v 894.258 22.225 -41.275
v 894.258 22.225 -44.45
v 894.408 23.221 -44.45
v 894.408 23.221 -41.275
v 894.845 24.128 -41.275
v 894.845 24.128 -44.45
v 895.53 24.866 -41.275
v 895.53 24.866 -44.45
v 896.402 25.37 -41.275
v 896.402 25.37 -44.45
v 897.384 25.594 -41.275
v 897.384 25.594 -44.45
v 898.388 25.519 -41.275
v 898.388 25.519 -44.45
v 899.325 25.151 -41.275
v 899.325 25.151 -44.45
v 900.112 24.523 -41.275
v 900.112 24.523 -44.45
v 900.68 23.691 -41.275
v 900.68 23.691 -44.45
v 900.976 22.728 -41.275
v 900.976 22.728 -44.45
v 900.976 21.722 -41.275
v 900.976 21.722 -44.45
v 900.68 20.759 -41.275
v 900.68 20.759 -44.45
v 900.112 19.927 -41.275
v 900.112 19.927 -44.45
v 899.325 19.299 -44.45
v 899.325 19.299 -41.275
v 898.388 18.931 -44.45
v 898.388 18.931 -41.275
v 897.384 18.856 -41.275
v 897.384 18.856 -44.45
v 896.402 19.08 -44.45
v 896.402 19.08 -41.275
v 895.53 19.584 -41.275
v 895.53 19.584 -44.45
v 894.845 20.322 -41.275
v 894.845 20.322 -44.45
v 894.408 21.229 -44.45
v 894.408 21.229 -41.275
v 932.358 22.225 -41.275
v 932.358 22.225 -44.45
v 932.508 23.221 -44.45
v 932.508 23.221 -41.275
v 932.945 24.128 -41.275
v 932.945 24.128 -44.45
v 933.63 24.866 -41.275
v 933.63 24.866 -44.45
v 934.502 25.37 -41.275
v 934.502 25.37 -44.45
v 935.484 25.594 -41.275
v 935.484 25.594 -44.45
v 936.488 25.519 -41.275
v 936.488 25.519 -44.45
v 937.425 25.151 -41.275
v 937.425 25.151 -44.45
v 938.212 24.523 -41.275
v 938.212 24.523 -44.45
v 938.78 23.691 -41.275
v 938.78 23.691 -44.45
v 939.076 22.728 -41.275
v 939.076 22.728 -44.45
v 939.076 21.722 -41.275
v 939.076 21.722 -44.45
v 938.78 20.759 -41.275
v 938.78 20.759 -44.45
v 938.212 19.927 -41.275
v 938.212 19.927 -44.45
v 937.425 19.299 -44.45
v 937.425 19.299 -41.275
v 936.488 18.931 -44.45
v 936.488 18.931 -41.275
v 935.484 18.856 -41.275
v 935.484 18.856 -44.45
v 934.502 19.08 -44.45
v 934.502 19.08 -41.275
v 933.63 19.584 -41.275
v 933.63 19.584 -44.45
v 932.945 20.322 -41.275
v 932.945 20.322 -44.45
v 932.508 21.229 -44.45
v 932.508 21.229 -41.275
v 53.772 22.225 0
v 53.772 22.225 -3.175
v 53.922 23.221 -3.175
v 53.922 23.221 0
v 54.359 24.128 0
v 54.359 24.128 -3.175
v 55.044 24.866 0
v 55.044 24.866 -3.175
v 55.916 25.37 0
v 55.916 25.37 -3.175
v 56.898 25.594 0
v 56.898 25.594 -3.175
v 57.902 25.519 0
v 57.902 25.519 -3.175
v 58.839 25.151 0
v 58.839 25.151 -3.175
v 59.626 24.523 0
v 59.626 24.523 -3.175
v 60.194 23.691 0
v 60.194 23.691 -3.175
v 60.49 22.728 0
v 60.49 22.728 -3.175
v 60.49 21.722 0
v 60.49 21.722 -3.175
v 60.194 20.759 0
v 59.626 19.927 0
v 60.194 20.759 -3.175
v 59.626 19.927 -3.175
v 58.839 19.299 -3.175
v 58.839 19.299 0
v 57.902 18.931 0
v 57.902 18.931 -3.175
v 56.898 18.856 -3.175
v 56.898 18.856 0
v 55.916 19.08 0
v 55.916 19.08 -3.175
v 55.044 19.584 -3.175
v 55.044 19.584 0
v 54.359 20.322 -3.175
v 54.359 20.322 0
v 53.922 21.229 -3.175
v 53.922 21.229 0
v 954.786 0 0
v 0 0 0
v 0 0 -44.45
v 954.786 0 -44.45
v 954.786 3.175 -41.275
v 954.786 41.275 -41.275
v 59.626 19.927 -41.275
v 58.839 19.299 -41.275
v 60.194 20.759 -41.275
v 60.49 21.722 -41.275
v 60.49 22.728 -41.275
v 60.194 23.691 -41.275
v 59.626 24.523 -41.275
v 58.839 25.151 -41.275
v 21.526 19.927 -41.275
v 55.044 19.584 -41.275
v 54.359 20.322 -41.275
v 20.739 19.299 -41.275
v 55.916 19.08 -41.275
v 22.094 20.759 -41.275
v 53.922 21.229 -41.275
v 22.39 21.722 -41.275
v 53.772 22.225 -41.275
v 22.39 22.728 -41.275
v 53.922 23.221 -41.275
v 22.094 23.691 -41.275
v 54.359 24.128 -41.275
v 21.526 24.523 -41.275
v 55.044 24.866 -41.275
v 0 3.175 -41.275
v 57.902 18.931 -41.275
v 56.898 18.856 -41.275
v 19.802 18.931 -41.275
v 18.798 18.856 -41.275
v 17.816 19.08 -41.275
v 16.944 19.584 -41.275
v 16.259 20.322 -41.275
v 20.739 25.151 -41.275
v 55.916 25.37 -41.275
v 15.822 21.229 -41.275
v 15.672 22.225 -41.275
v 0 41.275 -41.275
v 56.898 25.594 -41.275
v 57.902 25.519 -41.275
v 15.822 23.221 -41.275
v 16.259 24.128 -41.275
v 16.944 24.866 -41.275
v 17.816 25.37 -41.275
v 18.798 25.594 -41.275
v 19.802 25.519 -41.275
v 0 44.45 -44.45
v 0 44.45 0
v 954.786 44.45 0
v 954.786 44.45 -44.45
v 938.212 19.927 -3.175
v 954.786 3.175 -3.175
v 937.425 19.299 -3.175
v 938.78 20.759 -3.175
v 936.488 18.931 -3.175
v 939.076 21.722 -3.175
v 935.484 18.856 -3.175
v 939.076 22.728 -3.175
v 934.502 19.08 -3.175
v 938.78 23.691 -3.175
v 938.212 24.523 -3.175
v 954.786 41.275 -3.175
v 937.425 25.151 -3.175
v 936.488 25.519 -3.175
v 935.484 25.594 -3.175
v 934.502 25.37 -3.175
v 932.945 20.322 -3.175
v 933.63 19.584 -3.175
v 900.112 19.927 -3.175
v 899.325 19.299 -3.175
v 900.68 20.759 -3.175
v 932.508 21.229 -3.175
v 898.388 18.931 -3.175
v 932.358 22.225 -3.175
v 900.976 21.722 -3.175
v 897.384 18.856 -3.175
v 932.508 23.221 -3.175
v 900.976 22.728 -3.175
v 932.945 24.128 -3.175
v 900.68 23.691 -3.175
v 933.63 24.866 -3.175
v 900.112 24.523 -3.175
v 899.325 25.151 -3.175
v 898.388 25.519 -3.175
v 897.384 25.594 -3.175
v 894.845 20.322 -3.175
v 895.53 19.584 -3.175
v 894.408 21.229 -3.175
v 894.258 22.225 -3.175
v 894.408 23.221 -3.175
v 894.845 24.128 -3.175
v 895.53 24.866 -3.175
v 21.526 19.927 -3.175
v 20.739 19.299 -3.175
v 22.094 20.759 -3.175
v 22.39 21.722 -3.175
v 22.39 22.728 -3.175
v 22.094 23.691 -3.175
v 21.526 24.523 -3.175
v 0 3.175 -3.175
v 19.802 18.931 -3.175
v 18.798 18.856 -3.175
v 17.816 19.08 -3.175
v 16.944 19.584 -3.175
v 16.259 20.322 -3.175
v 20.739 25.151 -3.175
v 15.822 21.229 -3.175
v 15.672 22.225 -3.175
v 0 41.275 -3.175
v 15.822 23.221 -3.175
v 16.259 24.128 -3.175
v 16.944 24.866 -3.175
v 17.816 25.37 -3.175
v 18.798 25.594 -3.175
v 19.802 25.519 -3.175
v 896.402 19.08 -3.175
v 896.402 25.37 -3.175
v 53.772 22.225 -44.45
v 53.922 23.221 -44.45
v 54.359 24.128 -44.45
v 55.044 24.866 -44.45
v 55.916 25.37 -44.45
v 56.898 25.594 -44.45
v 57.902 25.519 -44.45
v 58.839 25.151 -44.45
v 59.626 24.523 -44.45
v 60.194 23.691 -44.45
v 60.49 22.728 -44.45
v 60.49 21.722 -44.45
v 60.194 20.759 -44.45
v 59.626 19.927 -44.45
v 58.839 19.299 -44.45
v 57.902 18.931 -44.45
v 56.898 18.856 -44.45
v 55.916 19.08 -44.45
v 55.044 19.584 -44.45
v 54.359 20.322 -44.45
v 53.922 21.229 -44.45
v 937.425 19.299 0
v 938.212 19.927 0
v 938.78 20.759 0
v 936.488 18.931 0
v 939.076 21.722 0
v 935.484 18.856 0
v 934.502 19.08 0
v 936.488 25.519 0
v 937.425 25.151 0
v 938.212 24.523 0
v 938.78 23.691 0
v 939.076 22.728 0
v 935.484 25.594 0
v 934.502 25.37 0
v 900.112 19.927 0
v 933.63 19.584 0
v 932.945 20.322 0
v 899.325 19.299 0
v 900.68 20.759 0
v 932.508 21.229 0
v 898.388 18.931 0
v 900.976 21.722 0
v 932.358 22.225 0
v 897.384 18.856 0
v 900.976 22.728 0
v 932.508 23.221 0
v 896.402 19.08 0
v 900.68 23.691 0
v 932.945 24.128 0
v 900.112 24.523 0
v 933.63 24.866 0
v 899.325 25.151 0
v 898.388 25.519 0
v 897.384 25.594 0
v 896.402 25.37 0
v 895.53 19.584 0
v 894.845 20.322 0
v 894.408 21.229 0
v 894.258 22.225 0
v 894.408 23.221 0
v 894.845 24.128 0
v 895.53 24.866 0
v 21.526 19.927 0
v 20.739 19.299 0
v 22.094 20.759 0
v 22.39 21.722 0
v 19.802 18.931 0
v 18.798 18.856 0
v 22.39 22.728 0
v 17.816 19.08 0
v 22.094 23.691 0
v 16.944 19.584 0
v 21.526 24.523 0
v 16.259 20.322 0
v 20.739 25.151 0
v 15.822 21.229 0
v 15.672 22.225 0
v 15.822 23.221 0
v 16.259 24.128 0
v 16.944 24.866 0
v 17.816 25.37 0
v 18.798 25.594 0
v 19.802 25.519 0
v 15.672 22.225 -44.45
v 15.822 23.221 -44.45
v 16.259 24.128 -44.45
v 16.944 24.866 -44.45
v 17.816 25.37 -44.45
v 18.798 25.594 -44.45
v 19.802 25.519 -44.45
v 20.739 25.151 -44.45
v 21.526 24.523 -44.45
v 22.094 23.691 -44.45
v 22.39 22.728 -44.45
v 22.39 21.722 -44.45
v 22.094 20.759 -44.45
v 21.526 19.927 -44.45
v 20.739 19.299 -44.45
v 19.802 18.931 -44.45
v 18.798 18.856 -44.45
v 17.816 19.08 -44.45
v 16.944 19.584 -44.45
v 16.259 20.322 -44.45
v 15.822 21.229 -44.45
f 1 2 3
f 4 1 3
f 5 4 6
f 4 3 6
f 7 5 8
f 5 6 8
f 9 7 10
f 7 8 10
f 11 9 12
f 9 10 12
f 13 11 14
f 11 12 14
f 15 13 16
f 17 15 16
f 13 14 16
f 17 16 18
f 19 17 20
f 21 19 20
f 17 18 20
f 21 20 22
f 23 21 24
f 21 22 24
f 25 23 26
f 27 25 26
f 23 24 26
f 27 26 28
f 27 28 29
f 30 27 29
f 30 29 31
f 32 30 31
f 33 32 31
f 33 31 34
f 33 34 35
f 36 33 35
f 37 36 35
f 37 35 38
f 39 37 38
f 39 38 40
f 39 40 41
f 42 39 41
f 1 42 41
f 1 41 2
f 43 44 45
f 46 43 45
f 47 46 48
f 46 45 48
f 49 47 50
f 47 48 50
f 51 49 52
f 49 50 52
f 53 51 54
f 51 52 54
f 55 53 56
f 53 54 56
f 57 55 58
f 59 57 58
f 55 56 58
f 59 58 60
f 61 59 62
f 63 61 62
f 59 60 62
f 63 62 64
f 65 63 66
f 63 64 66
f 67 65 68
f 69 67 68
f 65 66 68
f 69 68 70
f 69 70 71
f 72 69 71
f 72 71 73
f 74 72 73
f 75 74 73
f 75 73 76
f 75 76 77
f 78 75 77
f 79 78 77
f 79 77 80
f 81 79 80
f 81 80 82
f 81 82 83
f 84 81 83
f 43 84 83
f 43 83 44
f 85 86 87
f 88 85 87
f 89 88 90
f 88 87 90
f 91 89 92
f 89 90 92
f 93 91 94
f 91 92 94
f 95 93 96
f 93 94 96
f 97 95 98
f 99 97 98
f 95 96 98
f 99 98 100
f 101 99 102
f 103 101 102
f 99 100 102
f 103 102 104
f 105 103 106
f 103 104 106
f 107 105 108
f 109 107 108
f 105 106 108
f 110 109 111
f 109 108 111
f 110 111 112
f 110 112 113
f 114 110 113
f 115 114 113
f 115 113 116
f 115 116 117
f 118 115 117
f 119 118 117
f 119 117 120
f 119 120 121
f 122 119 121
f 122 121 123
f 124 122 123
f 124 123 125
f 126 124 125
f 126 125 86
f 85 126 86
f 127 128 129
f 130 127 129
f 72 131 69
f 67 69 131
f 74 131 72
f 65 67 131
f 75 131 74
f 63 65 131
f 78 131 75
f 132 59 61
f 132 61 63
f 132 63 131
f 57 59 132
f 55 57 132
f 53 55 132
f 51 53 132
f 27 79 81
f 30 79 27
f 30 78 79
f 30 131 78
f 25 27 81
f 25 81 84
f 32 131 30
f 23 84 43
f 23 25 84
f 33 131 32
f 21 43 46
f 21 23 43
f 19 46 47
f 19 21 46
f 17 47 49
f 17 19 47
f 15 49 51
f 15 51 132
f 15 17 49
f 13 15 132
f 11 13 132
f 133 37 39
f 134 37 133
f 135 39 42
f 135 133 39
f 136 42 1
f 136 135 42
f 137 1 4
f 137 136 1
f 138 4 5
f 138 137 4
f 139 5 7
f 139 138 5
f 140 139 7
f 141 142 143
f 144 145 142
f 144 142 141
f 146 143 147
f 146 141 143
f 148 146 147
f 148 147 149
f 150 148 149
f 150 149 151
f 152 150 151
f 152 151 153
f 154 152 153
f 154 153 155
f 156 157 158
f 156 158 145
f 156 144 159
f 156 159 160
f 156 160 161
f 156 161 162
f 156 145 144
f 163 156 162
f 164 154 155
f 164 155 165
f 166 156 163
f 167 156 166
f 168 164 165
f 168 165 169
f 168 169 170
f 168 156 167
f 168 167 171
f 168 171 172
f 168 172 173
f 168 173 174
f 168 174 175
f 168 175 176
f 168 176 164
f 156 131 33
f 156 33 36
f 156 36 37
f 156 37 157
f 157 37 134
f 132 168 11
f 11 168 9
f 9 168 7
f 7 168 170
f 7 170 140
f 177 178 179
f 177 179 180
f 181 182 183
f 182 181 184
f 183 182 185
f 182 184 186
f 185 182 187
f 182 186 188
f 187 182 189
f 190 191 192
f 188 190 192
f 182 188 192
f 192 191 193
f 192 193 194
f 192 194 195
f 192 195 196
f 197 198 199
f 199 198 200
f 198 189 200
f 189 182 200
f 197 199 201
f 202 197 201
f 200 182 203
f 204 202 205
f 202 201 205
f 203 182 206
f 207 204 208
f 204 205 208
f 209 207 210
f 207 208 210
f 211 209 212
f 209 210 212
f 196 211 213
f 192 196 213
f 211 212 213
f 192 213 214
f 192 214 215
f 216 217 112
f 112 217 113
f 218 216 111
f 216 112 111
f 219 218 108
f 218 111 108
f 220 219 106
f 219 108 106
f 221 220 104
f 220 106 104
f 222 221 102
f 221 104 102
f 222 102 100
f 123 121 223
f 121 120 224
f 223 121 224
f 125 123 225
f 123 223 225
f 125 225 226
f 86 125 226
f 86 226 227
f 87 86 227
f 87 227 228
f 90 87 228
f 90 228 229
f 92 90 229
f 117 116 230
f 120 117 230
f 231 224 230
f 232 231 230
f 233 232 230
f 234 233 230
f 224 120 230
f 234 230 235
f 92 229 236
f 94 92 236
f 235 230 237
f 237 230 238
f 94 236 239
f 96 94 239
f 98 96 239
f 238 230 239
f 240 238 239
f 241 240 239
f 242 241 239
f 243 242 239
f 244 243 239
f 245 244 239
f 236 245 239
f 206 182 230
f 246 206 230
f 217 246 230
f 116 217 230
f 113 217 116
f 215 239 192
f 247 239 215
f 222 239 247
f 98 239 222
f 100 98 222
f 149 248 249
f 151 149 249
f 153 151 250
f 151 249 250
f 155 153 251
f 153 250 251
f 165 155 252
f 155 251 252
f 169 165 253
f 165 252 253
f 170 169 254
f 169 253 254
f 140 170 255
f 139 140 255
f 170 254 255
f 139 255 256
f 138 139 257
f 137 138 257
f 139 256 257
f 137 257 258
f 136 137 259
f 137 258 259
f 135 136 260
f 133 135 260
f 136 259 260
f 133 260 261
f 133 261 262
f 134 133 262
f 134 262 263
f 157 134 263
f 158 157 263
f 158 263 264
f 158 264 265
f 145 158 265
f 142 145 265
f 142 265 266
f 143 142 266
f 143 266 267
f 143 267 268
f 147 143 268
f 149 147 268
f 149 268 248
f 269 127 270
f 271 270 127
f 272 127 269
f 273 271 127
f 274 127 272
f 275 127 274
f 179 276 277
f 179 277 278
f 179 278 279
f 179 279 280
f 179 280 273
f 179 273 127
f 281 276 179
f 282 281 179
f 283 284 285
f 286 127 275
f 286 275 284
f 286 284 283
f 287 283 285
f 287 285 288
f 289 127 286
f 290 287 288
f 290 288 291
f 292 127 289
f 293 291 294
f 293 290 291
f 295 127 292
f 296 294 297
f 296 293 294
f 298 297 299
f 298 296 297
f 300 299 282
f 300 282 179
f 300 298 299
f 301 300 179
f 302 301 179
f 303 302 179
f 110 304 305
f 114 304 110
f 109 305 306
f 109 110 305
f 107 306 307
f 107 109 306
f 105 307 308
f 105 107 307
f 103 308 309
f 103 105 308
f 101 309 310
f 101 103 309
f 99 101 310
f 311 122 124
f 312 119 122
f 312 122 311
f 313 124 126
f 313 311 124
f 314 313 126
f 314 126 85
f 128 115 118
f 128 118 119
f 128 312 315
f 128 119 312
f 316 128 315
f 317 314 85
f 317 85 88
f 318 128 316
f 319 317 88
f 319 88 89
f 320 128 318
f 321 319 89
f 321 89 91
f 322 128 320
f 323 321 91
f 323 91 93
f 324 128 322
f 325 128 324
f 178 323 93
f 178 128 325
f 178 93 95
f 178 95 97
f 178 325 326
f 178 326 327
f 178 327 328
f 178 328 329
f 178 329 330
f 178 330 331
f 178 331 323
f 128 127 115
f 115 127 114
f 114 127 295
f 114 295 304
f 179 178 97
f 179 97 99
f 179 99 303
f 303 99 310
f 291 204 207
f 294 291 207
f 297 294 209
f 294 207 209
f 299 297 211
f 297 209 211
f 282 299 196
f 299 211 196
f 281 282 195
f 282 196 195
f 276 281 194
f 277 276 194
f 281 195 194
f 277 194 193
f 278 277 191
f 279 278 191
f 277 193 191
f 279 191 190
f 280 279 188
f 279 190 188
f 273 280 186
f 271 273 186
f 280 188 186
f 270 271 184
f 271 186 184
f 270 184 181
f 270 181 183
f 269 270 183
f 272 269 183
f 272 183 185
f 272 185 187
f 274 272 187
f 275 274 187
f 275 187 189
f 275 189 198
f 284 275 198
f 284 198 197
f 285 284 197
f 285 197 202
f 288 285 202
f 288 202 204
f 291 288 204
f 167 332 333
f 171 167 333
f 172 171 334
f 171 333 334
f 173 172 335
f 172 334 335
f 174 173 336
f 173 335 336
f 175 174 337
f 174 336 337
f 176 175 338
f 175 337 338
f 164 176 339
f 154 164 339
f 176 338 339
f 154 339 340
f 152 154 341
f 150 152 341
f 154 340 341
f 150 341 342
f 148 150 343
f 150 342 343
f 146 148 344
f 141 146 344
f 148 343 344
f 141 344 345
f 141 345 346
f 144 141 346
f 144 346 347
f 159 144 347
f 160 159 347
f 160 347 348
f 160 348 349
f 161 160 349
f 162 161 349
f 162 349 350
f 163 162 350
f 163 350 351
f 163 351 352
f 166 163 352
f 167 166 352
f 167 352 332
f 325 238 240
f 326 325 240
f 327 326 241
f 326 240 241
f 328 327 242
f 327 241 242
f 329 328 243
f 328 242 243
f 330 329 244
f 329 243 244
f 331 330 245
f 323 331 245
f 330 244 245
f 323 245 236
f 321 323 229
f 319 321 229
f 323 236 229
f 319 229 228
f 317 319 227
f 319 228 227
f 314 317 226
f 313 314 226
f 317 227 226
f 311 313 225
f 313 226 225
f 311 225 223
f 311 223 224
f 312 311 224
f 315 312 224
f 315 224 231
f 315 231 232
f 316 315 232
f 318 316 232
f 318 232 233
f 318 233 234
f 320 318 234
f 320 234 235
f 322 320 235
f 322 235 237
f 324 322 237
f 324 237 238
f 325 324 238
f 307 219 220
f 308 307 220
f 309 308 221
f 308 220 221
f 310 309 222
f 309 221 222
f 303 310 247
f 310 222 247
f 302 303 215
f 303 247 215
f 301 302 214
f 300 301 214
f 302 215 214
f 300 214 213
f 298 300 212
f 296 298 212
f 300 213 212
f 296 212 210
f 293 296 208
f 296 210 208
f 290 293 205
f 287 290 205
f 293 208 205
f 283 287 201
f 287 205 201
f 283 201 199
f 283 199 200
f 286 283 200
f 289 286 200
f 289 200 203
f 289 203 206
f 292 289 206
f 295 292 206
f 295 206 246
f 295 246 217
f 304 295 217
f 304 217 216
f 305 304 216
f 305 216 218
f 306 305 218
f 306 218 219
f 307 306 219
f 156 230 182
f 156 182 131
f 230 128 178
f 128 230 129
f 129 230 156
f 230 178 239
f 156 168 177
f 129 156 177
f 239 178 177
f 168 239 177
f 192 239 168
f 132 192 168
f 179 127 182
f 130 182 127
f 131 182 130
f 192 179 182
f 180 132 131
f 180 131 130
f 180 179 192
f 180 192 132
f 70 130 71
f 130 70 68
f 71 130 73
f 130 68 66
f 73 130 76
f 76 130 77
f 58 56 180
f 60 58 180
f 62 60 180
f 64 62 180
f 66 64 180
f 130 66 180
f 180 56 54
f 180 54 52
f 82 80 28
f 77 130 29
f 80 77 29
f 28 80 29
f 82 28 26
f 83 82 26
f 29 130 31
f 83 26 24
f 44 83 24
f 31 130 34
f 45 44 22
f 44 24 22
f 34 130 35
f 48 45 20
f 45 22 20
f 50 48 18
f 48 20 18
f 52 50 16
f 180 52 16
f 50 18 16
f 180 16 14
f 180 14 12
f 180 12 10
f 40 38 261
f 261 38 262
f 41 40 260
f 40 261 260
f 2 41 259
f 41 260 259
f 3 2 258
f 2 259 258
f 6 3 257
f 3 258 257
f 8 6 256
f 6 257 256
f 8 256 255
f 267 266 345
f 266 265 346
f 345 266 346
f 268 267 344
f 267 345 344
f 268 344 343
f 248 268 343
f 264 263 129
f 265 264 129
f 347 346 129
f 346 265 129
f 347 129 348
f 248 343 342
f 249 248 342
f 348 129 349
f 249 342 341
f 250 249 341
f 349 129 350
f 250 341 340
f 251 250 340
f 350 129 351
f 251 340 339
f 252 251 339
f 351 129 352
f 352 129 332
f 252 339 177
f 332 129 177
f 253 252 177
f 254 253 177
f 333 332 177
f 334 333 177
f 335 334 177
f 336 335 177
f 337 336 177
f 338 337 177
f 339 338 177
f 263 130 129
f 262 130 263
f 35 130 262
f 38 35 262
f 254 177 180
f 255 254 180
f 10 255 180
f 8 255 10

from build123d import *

# Parameters (mm, degrees)
SKETCH1_W               = 44.45
SKETCH1_H               = 44.45
SKETCH1_W_2             = 38.1
SKETCH1_H_2             = 38.1
BOSS_EXTRUDE1_DEPTH     = 954.786
F_1_4_CLEARANCE_HOLE1_D = 6.7564


with BuildPart() as part:
    # Sketch1 → Boss-Extrude1 (new body)
    with BuildSketch(Plane(origin=(0, 0, 0), x_dir=(0, 0, -1), z_dir=(1, 0, 0))):
        with Locations((22.225, 22.225)):
            Rectangle(SKETCH1_W, SKETCH1_H)
        with Locations((22.225, 22.225)):
            Rectangle(SKETCH1_W_2, SKETCH1_H_2, mode=Mode.SUBTRACT)
    extrude(amount=BOSS_EXTRUDE1_DEPTH)

    # 1/4 Clearance Hole1 (through all)
    with Locations(Plane.XY):
        with Locations((19.05, 22.225), (57.15, 22.225), (935.736, 22.225), (897.636, 22.225)):
            Hole(F_1_4_CLEARANCE_HOLE1_D / 2)


solid = part.part
